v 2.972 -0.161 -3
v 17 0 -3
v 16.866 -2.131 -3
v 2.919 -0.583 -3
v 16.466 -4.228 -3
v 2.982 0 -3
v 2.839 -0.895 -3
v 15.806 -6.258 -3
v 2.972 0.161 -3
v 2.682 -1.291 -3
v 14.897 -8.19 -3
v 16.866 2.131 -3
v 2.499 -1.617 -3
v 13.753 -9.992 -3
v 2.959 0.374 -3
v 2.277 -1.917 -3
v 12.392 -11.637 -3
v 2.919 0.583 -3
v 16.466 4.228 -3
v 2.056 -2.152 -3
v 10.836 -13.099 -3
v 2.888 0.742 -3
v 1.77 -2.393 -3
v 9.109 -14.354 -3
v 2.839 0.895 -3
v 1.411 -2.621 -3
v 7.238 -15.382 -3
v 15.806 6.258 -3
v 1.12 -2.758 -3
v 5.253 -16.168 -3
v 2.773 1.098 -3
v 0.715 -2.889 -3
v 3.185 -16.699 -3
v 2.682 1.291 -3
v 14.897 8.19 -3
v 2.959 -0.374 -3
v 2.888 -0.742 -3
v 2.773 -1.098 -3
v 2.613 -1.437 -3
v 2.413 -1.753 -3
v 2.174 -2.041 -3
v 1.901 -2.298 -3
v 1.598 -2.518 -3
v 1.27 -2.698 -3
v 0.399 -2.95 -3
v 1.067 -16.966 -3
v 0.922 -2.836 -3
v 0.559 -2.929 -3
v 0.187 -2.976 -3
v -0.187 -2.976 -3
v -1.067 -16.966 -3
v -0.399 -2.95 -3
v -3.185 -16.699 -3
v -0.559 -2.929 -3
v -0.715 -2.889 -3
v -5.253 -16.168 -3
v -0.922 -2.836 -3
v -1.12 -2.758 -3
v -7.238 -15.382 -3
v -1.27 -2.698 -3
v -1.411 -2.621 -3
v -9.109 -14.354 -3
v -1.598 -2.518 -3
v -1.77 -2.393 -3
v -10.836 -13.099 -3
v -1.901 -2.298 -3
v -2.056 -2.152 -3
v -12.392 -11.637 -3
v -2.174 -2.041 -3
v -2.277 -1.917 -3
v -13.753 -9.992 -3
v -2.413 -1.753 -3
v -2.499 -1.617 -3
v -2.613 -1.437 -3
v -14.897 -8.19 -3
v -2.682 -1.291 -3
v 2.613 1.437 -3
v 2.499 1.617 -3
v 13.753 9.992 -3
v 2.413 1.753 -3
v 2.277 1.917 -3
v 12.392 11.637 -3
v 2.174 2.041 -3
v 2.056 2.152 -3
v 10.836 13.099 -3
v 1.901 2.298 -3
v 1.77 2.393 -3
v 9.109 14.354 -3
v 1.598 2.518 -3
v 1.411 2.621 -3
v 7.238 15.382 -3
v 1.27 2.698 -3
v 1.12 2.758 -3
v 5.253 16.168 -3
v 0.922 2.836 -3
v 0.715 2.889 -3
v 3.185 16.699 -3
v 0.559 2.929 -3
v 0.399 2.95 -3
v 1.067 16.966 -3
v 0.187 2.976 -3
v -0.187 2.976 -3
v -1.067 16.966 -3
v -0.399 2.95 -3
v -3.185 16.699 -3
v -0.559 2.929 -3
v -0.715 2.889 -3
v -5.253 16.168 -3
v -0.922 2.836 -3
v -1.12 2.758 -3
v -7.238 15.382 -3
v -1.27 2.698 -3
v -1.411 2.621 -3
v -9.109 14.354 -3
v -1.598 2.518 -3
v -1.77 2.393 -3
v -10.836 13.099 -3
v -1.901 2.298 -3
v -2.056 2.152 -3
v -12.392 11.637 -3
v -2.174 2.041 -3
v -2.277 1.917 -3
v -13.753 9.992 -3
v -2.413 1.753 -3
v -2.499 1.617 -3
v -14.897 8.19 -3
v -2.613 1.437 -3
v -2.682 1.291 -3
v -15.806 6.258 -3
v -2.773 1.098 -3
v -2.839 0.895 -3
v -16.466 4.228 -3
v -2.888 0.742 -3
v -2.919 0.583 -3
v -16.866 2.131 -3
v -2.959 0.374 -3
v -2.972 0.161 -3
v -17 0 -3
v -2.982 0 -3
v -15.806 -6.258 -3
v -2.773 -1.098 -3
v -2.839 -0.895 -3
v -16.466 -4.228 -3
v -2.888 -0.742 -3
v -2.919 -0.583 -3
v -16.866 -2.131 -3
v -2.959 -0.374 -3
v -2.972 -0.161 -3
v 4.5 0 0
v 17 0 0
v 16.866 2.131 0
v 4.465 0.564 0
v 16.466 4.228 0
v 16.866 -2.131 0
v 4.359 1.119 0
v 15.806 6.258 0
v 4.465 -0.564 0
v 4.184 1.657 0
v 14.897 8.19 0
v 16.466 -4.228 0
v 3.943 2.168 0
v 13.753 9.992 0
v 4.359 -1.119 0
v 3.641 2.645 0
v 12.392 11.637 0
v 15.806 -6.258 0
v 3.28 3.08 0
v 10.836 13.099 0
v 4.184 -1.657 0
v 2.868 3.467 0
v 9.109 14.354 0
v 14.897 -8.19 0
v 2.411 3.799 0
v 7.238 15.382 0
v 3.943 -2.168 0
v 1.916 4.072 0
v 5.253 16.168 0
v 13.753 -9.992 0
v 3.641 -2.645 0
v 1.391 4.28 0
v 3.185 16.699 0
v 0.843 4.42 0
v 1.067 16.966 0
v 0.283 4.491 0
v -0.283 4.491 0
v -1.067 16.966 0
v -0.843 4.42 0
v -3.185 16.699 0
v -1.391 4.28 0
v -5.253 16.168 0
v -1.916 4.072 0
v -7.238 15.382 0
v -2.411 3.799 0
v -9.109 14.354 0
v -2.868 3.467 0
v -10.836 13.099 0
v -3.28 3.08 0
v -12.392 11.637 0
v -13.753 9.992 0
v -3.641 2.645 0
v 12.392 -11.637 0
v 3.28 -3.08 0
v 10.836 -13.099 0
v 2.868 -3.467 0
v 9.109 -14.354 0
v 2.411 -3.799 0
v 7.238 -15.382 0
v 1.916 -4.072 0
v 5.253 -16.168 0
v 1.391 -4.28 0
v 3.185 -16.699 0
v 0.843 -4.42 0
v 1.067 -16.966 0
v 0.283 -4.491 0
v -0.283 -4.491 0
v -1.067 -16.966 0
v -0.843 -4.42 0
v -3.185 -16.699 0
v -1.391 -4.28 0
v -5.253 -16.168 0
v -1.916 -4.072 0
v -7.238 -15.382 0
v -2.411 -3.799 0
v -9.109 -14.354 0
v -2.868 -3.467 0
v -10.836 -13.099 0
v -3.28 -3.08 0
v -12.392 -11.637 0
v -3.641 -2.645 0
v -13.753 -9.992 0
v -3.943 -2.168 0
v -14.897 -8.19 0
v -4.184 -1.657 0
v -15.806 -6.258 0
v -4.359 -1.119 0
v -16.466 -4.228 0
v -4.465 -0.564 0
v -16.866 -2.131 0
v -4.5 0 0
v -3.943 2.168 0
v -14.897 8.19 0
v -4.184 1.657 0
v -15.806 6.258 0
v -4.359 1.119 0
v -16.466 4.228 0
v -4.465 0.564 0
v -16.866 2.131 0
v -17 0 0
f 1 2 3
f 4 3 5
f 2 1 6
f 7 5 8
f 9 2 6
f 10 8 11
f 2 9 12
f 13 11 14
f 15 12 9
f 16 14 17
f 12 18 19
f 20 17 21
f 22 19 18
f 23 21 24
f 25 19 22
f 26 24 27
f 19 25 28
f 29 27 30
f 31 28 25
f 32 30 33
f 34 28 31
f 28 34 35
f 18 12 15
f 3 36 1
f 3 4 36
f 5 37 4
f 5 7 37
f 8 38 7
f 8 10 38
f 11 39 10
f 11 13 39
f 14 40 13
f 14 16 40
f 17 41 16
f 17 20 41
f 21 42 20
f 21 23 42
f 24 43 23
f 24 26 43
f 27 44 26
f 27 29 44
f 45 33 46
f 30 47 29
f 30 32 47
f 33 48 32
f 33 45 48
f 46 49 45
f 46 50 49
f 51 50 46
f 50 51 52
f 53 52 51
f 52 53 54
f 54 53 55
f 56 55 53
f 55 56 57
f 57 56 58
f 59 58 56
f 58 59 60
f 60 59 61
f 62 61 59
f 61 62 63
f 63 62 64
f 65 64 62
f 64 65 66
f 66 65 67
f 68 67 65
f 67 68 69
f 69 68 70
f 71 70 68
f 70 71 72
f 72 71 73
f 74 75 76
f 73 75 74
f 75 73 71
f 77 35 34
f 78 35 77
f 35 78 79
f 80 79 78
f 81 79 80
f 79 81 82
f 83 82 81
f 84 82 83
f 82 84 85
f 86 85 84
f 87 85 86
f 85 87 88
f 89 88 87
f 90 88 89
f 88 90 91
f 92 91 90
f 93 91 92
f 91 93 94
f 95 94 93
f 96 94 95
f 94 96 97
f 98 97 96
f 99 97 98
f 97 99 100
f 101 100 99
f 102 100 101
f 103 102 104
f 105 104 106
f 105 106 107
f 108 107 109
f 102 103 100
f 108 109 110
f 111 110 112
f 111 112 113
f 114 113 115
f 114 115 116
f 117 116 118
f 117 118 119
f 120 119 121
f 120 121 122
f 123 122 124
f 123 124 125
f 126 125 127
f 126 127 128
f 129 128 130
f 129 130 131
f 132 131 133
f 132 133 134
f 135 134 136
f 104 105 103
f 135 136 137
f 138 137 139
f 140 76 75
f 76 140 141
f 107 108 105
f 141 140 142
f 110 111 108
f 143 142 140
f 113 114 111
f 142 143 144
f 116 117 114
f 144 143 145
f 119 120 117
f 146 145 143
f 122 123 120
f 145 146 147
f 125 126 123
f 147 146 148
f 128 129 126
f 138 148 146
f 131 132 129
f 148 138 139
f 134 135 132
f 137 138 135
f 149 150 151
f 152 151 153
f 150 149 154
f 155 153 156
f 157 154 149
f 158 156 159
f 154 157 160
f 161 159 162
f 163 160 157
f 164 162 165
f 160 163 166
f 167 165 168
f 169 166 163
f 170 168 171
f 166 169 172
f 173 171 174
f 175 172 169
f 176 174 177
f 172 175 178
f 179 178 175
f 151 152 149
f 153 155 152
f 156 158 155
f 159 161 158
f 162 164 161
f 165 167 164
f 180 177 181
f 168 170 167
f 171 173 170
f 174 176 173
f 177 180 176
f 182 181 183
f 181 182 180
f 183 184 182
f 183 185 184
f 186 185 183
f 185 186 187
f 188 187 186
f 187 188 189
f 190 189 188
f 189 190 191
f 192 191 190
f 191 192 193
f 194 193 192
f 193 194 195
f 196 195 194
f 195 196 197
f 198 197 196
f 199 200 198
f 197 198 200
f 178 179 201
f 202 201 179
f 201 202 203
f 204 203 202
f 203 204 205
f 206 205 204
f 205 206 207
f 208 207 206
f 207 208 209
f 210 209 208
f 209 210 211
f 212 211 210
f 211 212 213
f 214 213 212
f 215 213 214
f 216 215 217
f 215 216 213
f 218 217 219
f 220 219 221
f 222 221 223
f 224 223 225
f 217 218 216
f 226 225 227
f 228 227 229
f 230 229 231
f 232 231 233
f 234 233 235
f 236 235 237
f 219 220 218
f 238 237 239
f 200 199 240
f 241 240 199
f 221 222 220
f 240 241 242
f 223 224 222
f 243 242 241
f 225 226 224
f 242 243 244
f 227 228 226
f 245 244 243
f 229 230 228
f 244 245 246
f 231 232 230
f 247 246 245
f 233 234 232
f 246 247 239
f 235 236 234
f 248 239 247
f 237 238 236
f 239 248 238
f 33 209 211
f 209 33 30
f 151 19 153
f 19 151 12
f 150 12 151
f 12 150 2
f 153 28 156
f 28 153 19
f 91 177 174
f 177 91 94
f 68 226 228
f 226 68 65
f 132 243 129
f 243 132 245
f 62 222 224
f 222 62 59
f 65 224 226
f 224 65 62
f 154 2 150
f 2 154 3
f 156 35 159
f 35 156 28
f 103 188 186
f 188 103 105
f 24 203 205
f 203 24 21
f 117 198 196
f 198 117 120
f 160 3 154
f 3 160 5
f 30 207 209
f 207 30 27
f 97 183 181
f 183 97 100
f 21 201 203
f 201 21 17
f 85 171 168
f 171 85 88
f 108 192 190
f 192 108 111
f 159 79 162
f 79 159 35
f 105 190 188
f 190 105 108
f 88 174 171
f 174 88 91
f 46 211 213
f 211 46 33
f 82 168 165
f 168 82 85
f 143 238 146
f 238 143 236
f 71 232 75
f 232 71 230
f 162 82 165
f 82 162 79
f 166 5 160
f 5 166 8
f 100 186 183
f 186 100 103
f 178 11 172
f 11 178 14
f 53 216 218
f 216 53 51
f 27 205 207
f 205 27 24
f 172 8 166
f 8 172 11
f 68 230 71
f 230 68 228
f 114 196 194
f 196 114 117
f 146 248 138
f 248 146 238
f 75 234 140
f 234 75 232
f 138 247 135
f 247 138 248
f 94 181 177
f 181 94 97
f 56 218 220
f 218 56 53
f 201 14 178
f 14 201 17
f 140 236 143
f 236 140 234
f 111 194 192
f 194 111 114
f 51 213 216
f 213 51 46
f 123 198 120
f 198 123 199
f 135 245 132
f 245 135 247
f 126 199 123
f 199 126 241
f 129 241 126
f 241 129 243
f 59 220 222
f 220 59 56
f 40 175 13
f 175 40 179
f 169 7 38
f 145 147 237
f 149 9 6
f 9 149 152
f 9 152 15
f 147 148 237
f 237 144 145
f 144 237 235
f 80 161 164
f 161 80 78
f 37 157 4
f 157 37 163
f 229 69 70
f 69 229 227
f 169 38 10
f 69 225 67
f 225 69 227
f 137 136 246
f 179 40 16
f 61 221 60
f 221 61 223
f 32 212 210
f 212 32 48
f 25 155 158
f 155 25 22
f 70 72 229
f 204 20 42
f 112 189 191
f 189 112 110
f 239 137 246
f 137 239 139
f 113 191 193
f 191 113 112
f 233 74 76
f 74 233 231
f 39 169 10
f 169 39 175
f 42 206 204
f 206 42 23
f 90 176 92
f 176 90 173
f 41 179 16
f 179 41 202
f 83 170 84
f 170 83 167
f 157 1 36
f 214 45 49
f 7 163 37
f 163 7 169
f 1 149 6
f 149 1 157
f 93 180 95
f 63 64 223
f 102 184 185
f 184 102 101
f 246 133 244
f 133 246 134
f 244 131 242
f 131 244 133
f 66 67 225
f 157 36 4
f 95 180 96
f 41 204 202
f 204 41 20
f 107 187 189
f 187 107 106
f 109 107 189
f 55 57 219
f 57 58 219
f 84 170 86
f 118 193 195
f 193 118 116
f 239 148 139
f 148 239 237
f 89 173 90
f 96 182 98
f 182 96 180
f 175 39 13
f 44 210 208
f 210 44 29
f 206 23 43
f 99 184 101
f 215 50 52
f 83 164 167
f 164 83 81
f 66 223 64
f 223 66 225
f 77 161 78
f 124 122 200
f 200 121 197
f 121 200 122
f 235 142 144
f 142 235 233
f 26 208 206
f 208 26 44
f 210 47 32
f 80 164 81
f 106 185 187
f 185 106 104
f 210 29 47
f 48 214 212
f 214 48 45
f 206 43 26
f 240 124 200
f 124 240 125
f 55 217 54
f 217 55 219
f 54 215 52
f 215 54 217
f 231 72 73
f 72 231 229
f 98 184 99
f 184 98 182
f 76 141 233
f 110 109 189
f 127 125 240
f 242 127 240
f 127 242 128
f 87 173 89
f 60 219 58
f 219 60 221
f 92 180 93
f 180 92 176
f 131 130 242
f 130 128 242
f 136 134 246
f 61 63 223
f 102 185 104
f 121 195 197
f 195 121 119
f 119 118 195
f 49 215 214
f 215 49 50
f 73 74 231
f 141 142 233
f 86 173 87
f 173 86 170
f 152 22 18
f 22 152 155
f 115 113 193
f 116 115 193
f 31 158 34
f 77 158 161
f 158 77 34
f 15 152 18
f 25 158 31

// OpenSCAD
$fn = 50;


difference() {
	union() {
		translate(v = [0, 0, -3.0000000000]) {
			cylinder(h = 3, r = 7.0000000000);
		}
		translate(v = [0, 0, -3.0000000000]) {
			cylinder(h = 3, r = 17.0000000000);
		}
	}
	union() {
		translate(v = [0, 0, 0]) {
			rotate(a = [0, 0, 0]) {
				difference() {
					union() {
						#translate(v = [0, 0, -3.0000000000]) {
							cylinder(h = 3, r = 2.2500000000);
						}
						#translate(v = [0, 0, -4.2000000000]) {
							cylinder(h = 4.2000000000, r1 = 2.3750000000, r2 = 4.5000000000);
						}
						#translate(v = [0, 0, -3.0000000000]) {
							cylinder(h = 3, r = 2.3750000000);
						}
						#translate(v = [0, 0, -3.0000000000]) {
							cylinder(h = 3, r = 2.2500000000);
						}
					}
					union();
				}
			}
		}
	}
}
